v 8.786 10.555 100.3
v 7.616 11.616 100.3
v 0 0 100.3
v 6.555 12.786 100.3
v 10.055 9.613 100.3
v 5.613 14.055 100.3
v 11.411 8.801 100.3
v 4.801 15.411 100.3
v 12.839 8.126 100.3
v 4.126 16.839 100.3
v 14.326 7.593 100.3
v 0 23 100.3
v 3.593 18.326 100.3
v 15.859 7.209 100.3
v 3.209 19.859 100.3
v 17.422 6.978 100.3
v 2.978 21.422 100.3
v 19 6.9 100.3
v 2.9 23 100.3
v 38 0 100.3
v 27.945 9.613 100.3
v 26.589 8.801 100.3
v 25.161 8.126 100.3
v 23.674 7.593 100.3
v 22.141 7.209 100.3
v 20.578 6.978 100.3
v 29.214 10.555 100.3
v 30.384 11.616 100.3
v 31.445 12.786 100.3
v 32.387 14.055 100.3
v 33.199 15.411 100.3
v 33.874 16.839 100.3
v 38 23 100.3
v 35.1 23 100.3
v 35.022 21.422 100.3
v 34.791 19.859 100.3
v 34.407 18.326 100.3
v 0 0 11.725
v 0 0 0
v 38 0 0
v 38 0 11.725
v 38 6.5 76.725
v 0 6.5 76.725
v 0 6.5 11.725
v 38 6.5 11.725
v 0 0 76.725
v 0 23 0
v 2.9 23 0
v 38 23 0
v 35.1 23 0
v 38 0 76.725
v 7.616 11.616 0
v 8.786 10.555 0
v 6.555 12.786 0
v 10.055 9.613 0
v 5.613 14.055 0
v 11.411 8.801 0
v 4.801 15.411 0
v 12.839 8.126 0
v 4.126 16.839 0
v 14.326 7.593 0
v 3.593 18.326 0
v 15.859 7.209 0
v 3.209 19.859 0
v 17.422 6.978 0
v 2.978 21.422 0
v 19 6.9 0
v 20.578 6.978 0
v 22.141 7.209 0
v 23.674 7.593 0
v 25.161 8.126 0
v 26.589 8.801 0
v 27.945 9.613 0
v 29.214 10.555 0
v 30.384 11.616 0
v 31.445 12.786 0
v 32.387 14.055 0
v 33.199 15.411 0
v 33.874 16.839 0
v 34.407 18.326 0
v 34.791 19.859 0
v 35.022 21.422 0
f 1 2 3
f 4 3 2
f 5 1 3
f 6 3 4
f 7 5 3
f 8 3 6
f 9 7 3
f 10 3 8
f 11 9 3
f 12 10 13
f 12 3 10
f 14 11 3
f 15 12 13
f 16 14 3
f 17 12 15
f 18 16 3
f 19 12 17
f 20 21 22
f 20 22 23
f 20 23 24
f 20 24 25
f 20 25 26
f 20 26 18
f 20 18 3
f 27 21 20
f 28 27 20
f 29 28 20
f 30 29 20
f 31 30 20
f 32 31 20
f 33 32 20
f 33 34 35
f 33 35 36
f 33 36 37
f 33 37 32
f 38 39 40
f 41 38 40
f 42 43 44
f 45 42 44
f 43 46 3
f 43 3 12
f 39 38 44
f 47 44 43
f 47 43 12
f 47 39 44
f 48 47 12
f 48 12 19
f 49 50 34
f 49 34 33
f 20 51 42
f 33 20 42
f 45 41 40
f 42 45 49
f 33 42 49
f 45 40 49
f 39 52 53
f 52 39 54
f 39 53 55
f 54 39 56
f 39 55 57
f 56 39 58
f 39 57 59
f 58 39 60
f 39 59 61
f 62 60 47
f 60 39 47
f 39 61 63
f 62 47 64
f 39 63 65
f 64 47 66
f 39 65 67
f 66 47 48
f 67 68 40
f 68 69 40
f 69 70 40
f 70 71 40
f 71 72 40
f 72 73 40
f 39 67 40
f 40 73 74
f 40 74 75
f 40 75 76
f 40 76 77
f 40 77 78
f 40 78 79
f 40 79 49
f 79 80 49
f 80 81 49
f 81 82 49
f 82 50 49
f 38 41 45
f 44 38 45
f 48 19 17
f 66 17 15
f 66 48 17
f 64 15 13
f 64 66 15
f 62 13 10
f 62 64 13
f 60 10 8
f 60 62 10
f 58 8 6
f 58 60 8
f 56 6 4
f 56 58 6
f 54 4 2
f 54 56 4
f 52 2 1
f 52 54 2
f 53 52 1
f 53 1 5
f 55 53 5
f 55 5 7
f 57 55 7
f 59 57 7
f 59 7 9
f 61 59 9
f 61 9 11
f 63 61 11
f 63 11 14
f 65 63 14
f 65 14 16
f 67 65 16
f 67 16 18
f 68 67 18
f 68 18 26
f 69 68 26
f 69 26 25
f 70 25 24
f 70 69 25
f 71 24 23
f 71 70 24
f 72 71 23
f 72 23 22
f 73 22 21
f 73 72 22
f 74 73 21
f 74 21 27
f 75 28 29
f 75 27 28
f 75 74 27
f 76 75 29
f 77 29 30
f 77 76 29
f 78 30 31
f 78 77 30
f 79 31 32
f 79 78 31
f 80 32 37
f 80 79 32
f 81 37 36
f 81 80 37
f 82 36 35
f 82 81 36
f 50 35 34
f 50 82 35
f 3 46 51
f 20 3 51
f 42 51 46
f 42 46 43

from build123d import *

# Parameters (mm, degrees)
ESQUISSE1_W             = 38
ESQUISSE1_H             = 23
BOSS_EXTRU_1_DEPTH      = 100.3
ESQUISSE4_R             = 16.1
ENL_V_MAT_EXTRU_1_DEPTH = 101.3
ESQUISSE5_W             = 65
ESQUISSE5_H             = 6.5
ENL_V_MAT_EXTRU_2_DEPTH = 39


with BuildPart() as part:
    # Esquisse1 → Boss.-Extru.1 (new body)
    with BuildSketch(Plane.XY):
        with Locations((19, 11.5)):
            Rectangle(ESQUISSE1_W, ESQUISSE1_H)
    extrude(amount=BOSS_EXTRU_1_DEPTH)

    # Esquisse4 → Enlèv. mat.-Extru.1 (cut, through all)
    with BuildSketch(Plane.XY):
        with Locations((19, 23)):
            Circle(ESQUISSE4_R)
    extrude(amount=ENL_V_MAT_EXTRU_1_DEPTH, mode=Mode.SUBTRACT)

    # Esquisse5 → Enlèv. mat.-Extru.2 (cut, through all)
    with BuildSketch(Plane(origin=(0, 0, 0), x_dir=(0, 0, -1), z_dir=(1, 0, 0))):
        with Locations((-44.225007926, 3.25)):
            Rectangle(ESQUISSE5_W, ESQUISSE5_H)
    extrude(amount=ENL_V_MAT_EXTRU_2_DEPTH, mode=Mode.SUBTRACT)


solid = part.part
